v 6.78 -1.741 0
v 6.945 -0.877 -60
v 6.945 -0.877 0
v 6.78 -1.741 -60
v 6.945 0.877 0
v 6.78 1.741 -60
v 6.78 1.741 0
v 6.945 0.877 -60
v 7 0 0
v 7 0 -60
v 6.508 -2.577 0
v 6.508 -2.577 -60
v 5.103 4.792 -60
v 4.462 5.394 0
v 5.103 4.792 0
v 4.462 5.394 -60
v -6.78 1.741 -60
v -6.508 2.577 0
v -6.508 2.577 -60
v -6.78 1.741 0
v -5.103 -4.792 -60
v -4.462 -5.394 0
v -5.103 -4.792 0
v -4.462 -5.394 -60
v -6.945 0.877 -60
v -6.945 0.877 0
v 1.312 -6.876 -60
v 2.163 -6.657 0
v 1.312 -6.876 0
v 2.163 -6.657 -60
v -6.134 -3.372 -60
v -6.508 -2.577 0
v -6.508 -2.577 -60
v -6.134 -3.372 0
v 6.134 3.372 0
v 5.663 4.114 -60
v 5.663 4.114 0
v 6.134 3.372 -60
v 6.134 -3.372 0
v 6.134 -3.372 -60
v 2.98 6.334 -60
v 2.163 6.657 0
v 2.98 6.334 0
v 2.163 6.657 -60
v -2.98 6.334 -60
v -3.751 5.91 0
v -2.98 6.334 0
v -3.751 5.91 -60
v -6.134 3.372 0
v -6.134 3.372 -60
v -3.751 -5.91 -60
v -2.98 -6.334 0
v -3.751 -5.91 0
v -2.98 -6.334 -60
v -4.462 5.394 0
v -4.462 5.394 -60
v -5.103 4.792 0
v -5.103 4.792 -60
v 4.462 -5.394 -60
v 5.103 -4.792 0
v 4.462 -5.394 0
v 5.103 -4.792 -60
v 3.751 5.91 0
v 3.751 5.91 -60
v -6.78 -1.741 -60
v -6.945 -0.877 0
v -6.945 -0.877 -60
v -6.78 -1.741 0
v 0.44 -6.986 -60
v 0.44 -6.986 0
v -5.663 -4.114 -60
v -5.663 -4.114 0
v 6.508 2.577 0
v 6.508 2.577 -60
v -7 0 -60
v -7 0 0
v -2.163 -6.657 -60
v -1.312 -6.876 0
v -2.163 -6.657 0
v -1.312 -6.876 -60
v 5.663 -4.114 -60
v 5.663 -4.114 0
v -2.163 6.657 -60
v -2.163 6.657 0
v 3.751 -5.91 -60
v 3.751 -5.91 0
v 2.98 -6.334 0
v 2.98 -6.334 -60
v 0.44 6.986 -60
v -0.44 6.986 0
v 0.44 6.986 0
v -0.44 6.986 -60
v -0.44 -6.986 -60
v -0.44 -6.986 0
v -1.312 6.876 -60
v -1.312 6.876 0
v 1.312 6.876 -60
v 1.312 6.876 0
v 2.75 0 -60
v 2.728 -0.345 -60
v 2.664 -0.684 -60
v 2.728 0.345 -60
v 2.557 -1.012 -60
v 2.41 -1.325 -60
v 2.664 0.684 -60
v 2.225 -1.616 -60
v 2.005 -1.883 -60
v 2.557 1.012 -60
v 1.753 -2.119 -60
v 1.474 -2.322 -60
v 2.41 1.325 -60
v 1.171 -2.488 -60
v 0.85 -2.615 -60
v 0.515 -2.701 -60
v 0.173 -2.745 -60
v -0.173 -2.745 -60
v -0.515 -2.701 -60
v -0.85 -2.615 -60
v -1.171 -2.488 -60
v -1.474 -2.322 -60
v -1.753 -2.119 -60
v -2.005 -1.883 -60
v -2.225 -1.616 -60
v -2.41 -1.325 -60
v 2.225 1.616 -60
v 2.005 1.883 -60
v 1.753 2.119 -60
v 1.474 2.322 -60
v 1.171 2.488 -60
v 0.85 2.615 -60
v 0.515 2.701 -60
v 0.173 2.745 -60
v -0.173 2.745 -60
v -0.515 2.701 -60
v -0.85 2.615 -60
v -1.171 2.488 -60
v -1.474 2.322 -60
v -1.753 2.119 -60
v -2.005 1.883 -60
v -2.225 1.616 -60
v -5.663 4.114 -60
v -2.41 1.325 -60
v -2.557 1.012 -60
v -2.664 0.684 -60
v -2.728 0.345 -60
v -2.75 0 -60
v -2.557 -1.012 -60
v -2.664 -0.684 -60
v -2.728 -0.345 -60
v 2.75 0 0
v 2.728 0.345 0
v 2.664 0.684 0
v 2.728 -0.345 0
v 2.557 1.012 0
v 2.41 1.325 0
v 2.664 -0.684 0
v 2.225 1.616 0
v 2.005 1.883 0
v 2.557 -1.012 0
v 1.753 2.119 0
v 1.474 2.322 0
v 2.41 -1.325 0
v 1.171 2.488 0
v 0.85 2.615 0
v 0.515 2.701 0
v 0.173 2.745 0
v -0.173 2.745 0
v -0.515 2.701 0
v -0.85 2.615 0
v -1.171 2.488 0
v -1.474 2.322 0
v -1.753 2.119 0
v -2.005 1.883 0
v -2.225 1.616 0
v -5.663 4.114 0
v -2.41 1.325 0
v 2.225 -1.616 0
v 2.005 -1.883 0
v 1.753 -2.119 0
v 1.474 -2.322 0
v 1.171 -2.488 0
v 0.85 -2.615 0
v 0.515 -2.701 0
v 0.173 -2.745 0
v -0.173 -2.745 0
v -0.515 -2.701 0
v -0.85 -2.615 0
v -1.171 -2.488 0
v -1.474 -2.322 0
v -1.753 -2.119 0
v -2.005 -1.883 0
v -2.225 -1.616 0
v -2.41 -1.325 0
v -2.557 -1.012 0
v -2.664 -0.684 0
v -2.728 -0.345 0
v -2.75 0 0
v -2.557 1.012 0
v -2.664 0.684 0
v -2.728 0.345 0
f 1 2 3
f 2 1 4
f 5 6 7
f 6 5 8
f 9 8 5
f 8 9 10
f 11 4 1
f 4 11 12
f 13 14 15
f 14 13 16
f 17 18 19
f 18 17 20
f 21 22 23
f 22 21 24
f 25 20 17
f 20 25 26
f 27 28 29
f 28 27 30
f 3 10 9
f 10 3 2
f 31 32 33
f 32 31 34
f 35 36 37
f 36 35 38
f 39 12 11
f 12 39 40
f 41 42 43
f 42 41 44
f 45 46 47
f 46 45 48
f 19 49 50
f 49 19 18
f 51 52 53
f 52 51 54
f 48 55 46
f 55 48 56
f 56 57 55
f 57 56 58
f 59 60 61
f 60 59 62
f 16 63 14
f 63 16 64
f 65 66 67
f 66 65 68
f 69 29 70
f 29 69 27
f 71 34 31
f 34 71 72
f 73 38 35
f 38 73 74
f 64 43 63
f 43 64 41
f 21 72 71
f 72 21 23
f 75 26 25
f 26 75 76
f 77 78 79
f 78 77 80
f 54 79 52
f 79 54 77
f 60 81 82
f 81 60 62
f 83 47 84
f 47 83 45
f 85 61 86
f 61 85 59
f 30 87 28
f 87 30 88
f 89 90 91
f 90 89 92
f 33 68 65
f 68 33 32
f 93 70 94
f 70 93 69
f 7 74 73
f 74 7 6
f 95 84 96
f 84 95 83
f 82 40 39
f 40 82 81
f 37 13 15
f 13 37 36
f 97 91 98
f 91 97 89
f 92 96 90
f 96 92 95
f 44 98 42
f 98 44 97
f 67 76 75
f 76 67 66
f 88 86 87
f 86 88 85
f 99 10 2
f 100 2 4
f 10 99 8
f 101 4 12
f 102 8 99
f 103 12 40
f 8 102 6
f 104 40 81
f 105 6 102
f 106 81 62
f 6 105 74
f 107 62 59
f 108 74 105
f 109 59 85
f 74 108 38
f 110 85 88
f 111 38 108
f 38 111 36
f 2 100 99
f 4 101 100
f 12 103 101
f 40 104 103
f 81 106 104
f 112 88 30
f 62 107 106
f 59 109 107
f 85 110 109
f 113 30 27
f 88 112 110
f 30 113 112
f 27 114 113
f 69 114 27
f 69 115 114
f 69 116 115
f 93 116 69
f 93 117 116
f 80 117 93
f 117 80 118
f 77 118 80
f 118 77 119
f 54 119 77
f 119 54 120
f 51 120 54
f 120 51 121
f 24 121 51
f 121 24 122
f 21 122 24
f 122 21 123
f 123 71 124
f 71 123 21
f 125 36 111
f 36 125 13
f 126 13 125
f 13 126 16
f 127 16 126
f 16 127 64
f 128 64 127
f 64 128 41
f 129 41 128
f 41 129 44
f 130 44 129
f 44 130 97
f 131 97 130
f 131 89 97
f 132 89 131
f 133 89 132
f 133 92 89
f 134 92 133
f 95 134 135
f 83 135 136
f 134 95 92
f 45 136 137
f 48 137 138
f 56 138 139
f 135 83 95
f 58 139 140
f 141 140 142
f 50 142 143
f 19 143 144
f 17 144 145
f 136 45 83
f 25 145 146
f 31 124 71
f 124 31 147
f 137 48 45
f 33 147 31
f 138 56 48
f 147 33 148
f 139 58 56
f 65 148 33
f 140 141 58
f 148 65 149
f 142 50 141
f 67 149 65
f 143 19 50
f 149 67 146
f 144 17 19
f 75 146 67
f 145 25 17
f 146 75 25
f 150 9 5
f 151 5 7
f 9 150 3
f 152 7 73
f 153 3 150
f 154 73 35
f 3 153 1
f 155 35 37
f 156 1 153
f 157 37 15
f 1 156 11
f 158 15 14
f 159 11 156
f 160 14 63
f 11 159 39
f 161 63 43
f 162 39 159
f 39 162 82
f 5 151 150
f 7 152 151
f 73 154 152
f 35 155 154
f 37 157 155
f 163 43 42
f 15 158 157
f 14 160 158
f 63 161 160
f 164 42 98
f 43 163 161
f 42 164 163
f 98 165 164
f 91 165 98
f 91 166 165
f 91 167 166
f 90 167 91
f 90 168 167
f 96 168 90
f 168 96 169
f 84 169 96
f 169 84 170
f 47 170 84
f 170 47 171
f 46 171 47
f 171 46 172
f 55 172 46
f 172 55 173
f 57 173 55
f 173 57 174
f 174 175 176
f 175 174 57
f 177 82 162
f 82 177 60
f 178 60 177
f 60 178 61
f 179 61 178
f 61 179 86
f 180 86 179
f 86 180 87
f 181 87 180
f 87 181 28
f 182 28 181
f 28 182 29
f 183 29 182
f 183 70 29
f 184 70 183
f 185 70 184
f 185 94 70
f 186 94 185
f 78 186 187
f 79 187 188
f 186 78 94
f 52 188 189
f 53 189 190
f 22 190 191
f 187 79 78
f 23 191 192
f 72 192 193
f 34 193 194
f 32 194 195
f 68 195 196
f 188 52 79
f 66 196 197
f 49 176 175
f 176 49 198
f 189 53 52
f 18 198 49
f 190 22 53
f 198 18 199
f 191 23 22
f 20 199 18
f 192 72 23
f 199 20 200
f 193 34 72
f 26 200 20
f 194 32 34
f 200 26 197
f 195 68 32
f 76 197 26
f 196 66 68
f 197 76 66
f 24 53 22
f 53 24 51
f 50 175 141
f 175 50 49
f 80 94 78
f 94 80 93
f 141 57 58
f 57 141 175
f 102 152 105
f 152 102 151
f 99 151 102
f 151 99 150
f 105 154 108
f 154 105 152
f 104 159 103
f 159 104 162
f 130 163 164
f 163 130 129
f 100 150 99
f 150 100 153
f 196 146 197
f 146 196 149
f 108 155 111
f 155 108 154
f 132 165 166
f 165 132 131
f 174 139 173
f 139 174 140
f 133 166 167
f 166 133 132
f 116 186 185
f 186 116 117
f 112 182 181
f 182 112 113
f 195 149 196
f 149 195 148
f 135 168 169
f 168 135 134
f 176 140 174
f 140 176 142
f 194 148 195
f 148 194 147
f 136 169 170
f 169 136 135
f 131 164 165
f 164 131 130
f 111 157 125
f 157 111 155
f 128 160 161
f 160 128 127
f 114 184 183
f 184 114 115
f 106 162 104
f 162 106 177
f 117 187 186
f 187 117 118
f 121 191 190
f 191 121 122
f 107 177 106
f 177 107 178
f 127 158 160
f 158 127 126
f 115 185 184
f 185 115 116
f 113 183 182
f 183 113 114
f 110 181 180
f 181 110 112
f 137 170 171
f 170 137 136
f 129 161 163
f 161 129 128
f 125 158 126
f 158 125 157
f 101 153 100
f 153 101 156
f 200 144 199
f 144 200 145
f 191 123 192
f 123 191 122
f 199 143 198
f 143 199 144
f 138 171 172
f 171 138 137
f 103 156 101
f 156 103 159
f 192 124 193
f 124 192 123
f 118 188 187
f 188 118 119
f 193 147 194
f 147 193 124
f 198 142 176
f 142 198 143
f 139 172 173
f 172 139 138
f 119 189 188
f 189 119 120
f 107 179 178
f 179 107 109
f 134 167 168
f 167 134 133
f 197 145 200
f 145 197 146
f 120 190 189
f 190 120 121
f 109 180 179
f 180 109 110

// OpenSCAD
$fn = 50;


difference() {
	union() {
		translate(v = [0, 0, -60.0000000000]) {
			cylinder(h = 60, r = 7.0000000000);
		}
		cylinder(h = 0, r = 16.0000000000);
	}
	union() {
		#translate(v = [0, 0, -60]) {
			cylinder(h = 60, r = 2.7500000000);
		}
	}
}
